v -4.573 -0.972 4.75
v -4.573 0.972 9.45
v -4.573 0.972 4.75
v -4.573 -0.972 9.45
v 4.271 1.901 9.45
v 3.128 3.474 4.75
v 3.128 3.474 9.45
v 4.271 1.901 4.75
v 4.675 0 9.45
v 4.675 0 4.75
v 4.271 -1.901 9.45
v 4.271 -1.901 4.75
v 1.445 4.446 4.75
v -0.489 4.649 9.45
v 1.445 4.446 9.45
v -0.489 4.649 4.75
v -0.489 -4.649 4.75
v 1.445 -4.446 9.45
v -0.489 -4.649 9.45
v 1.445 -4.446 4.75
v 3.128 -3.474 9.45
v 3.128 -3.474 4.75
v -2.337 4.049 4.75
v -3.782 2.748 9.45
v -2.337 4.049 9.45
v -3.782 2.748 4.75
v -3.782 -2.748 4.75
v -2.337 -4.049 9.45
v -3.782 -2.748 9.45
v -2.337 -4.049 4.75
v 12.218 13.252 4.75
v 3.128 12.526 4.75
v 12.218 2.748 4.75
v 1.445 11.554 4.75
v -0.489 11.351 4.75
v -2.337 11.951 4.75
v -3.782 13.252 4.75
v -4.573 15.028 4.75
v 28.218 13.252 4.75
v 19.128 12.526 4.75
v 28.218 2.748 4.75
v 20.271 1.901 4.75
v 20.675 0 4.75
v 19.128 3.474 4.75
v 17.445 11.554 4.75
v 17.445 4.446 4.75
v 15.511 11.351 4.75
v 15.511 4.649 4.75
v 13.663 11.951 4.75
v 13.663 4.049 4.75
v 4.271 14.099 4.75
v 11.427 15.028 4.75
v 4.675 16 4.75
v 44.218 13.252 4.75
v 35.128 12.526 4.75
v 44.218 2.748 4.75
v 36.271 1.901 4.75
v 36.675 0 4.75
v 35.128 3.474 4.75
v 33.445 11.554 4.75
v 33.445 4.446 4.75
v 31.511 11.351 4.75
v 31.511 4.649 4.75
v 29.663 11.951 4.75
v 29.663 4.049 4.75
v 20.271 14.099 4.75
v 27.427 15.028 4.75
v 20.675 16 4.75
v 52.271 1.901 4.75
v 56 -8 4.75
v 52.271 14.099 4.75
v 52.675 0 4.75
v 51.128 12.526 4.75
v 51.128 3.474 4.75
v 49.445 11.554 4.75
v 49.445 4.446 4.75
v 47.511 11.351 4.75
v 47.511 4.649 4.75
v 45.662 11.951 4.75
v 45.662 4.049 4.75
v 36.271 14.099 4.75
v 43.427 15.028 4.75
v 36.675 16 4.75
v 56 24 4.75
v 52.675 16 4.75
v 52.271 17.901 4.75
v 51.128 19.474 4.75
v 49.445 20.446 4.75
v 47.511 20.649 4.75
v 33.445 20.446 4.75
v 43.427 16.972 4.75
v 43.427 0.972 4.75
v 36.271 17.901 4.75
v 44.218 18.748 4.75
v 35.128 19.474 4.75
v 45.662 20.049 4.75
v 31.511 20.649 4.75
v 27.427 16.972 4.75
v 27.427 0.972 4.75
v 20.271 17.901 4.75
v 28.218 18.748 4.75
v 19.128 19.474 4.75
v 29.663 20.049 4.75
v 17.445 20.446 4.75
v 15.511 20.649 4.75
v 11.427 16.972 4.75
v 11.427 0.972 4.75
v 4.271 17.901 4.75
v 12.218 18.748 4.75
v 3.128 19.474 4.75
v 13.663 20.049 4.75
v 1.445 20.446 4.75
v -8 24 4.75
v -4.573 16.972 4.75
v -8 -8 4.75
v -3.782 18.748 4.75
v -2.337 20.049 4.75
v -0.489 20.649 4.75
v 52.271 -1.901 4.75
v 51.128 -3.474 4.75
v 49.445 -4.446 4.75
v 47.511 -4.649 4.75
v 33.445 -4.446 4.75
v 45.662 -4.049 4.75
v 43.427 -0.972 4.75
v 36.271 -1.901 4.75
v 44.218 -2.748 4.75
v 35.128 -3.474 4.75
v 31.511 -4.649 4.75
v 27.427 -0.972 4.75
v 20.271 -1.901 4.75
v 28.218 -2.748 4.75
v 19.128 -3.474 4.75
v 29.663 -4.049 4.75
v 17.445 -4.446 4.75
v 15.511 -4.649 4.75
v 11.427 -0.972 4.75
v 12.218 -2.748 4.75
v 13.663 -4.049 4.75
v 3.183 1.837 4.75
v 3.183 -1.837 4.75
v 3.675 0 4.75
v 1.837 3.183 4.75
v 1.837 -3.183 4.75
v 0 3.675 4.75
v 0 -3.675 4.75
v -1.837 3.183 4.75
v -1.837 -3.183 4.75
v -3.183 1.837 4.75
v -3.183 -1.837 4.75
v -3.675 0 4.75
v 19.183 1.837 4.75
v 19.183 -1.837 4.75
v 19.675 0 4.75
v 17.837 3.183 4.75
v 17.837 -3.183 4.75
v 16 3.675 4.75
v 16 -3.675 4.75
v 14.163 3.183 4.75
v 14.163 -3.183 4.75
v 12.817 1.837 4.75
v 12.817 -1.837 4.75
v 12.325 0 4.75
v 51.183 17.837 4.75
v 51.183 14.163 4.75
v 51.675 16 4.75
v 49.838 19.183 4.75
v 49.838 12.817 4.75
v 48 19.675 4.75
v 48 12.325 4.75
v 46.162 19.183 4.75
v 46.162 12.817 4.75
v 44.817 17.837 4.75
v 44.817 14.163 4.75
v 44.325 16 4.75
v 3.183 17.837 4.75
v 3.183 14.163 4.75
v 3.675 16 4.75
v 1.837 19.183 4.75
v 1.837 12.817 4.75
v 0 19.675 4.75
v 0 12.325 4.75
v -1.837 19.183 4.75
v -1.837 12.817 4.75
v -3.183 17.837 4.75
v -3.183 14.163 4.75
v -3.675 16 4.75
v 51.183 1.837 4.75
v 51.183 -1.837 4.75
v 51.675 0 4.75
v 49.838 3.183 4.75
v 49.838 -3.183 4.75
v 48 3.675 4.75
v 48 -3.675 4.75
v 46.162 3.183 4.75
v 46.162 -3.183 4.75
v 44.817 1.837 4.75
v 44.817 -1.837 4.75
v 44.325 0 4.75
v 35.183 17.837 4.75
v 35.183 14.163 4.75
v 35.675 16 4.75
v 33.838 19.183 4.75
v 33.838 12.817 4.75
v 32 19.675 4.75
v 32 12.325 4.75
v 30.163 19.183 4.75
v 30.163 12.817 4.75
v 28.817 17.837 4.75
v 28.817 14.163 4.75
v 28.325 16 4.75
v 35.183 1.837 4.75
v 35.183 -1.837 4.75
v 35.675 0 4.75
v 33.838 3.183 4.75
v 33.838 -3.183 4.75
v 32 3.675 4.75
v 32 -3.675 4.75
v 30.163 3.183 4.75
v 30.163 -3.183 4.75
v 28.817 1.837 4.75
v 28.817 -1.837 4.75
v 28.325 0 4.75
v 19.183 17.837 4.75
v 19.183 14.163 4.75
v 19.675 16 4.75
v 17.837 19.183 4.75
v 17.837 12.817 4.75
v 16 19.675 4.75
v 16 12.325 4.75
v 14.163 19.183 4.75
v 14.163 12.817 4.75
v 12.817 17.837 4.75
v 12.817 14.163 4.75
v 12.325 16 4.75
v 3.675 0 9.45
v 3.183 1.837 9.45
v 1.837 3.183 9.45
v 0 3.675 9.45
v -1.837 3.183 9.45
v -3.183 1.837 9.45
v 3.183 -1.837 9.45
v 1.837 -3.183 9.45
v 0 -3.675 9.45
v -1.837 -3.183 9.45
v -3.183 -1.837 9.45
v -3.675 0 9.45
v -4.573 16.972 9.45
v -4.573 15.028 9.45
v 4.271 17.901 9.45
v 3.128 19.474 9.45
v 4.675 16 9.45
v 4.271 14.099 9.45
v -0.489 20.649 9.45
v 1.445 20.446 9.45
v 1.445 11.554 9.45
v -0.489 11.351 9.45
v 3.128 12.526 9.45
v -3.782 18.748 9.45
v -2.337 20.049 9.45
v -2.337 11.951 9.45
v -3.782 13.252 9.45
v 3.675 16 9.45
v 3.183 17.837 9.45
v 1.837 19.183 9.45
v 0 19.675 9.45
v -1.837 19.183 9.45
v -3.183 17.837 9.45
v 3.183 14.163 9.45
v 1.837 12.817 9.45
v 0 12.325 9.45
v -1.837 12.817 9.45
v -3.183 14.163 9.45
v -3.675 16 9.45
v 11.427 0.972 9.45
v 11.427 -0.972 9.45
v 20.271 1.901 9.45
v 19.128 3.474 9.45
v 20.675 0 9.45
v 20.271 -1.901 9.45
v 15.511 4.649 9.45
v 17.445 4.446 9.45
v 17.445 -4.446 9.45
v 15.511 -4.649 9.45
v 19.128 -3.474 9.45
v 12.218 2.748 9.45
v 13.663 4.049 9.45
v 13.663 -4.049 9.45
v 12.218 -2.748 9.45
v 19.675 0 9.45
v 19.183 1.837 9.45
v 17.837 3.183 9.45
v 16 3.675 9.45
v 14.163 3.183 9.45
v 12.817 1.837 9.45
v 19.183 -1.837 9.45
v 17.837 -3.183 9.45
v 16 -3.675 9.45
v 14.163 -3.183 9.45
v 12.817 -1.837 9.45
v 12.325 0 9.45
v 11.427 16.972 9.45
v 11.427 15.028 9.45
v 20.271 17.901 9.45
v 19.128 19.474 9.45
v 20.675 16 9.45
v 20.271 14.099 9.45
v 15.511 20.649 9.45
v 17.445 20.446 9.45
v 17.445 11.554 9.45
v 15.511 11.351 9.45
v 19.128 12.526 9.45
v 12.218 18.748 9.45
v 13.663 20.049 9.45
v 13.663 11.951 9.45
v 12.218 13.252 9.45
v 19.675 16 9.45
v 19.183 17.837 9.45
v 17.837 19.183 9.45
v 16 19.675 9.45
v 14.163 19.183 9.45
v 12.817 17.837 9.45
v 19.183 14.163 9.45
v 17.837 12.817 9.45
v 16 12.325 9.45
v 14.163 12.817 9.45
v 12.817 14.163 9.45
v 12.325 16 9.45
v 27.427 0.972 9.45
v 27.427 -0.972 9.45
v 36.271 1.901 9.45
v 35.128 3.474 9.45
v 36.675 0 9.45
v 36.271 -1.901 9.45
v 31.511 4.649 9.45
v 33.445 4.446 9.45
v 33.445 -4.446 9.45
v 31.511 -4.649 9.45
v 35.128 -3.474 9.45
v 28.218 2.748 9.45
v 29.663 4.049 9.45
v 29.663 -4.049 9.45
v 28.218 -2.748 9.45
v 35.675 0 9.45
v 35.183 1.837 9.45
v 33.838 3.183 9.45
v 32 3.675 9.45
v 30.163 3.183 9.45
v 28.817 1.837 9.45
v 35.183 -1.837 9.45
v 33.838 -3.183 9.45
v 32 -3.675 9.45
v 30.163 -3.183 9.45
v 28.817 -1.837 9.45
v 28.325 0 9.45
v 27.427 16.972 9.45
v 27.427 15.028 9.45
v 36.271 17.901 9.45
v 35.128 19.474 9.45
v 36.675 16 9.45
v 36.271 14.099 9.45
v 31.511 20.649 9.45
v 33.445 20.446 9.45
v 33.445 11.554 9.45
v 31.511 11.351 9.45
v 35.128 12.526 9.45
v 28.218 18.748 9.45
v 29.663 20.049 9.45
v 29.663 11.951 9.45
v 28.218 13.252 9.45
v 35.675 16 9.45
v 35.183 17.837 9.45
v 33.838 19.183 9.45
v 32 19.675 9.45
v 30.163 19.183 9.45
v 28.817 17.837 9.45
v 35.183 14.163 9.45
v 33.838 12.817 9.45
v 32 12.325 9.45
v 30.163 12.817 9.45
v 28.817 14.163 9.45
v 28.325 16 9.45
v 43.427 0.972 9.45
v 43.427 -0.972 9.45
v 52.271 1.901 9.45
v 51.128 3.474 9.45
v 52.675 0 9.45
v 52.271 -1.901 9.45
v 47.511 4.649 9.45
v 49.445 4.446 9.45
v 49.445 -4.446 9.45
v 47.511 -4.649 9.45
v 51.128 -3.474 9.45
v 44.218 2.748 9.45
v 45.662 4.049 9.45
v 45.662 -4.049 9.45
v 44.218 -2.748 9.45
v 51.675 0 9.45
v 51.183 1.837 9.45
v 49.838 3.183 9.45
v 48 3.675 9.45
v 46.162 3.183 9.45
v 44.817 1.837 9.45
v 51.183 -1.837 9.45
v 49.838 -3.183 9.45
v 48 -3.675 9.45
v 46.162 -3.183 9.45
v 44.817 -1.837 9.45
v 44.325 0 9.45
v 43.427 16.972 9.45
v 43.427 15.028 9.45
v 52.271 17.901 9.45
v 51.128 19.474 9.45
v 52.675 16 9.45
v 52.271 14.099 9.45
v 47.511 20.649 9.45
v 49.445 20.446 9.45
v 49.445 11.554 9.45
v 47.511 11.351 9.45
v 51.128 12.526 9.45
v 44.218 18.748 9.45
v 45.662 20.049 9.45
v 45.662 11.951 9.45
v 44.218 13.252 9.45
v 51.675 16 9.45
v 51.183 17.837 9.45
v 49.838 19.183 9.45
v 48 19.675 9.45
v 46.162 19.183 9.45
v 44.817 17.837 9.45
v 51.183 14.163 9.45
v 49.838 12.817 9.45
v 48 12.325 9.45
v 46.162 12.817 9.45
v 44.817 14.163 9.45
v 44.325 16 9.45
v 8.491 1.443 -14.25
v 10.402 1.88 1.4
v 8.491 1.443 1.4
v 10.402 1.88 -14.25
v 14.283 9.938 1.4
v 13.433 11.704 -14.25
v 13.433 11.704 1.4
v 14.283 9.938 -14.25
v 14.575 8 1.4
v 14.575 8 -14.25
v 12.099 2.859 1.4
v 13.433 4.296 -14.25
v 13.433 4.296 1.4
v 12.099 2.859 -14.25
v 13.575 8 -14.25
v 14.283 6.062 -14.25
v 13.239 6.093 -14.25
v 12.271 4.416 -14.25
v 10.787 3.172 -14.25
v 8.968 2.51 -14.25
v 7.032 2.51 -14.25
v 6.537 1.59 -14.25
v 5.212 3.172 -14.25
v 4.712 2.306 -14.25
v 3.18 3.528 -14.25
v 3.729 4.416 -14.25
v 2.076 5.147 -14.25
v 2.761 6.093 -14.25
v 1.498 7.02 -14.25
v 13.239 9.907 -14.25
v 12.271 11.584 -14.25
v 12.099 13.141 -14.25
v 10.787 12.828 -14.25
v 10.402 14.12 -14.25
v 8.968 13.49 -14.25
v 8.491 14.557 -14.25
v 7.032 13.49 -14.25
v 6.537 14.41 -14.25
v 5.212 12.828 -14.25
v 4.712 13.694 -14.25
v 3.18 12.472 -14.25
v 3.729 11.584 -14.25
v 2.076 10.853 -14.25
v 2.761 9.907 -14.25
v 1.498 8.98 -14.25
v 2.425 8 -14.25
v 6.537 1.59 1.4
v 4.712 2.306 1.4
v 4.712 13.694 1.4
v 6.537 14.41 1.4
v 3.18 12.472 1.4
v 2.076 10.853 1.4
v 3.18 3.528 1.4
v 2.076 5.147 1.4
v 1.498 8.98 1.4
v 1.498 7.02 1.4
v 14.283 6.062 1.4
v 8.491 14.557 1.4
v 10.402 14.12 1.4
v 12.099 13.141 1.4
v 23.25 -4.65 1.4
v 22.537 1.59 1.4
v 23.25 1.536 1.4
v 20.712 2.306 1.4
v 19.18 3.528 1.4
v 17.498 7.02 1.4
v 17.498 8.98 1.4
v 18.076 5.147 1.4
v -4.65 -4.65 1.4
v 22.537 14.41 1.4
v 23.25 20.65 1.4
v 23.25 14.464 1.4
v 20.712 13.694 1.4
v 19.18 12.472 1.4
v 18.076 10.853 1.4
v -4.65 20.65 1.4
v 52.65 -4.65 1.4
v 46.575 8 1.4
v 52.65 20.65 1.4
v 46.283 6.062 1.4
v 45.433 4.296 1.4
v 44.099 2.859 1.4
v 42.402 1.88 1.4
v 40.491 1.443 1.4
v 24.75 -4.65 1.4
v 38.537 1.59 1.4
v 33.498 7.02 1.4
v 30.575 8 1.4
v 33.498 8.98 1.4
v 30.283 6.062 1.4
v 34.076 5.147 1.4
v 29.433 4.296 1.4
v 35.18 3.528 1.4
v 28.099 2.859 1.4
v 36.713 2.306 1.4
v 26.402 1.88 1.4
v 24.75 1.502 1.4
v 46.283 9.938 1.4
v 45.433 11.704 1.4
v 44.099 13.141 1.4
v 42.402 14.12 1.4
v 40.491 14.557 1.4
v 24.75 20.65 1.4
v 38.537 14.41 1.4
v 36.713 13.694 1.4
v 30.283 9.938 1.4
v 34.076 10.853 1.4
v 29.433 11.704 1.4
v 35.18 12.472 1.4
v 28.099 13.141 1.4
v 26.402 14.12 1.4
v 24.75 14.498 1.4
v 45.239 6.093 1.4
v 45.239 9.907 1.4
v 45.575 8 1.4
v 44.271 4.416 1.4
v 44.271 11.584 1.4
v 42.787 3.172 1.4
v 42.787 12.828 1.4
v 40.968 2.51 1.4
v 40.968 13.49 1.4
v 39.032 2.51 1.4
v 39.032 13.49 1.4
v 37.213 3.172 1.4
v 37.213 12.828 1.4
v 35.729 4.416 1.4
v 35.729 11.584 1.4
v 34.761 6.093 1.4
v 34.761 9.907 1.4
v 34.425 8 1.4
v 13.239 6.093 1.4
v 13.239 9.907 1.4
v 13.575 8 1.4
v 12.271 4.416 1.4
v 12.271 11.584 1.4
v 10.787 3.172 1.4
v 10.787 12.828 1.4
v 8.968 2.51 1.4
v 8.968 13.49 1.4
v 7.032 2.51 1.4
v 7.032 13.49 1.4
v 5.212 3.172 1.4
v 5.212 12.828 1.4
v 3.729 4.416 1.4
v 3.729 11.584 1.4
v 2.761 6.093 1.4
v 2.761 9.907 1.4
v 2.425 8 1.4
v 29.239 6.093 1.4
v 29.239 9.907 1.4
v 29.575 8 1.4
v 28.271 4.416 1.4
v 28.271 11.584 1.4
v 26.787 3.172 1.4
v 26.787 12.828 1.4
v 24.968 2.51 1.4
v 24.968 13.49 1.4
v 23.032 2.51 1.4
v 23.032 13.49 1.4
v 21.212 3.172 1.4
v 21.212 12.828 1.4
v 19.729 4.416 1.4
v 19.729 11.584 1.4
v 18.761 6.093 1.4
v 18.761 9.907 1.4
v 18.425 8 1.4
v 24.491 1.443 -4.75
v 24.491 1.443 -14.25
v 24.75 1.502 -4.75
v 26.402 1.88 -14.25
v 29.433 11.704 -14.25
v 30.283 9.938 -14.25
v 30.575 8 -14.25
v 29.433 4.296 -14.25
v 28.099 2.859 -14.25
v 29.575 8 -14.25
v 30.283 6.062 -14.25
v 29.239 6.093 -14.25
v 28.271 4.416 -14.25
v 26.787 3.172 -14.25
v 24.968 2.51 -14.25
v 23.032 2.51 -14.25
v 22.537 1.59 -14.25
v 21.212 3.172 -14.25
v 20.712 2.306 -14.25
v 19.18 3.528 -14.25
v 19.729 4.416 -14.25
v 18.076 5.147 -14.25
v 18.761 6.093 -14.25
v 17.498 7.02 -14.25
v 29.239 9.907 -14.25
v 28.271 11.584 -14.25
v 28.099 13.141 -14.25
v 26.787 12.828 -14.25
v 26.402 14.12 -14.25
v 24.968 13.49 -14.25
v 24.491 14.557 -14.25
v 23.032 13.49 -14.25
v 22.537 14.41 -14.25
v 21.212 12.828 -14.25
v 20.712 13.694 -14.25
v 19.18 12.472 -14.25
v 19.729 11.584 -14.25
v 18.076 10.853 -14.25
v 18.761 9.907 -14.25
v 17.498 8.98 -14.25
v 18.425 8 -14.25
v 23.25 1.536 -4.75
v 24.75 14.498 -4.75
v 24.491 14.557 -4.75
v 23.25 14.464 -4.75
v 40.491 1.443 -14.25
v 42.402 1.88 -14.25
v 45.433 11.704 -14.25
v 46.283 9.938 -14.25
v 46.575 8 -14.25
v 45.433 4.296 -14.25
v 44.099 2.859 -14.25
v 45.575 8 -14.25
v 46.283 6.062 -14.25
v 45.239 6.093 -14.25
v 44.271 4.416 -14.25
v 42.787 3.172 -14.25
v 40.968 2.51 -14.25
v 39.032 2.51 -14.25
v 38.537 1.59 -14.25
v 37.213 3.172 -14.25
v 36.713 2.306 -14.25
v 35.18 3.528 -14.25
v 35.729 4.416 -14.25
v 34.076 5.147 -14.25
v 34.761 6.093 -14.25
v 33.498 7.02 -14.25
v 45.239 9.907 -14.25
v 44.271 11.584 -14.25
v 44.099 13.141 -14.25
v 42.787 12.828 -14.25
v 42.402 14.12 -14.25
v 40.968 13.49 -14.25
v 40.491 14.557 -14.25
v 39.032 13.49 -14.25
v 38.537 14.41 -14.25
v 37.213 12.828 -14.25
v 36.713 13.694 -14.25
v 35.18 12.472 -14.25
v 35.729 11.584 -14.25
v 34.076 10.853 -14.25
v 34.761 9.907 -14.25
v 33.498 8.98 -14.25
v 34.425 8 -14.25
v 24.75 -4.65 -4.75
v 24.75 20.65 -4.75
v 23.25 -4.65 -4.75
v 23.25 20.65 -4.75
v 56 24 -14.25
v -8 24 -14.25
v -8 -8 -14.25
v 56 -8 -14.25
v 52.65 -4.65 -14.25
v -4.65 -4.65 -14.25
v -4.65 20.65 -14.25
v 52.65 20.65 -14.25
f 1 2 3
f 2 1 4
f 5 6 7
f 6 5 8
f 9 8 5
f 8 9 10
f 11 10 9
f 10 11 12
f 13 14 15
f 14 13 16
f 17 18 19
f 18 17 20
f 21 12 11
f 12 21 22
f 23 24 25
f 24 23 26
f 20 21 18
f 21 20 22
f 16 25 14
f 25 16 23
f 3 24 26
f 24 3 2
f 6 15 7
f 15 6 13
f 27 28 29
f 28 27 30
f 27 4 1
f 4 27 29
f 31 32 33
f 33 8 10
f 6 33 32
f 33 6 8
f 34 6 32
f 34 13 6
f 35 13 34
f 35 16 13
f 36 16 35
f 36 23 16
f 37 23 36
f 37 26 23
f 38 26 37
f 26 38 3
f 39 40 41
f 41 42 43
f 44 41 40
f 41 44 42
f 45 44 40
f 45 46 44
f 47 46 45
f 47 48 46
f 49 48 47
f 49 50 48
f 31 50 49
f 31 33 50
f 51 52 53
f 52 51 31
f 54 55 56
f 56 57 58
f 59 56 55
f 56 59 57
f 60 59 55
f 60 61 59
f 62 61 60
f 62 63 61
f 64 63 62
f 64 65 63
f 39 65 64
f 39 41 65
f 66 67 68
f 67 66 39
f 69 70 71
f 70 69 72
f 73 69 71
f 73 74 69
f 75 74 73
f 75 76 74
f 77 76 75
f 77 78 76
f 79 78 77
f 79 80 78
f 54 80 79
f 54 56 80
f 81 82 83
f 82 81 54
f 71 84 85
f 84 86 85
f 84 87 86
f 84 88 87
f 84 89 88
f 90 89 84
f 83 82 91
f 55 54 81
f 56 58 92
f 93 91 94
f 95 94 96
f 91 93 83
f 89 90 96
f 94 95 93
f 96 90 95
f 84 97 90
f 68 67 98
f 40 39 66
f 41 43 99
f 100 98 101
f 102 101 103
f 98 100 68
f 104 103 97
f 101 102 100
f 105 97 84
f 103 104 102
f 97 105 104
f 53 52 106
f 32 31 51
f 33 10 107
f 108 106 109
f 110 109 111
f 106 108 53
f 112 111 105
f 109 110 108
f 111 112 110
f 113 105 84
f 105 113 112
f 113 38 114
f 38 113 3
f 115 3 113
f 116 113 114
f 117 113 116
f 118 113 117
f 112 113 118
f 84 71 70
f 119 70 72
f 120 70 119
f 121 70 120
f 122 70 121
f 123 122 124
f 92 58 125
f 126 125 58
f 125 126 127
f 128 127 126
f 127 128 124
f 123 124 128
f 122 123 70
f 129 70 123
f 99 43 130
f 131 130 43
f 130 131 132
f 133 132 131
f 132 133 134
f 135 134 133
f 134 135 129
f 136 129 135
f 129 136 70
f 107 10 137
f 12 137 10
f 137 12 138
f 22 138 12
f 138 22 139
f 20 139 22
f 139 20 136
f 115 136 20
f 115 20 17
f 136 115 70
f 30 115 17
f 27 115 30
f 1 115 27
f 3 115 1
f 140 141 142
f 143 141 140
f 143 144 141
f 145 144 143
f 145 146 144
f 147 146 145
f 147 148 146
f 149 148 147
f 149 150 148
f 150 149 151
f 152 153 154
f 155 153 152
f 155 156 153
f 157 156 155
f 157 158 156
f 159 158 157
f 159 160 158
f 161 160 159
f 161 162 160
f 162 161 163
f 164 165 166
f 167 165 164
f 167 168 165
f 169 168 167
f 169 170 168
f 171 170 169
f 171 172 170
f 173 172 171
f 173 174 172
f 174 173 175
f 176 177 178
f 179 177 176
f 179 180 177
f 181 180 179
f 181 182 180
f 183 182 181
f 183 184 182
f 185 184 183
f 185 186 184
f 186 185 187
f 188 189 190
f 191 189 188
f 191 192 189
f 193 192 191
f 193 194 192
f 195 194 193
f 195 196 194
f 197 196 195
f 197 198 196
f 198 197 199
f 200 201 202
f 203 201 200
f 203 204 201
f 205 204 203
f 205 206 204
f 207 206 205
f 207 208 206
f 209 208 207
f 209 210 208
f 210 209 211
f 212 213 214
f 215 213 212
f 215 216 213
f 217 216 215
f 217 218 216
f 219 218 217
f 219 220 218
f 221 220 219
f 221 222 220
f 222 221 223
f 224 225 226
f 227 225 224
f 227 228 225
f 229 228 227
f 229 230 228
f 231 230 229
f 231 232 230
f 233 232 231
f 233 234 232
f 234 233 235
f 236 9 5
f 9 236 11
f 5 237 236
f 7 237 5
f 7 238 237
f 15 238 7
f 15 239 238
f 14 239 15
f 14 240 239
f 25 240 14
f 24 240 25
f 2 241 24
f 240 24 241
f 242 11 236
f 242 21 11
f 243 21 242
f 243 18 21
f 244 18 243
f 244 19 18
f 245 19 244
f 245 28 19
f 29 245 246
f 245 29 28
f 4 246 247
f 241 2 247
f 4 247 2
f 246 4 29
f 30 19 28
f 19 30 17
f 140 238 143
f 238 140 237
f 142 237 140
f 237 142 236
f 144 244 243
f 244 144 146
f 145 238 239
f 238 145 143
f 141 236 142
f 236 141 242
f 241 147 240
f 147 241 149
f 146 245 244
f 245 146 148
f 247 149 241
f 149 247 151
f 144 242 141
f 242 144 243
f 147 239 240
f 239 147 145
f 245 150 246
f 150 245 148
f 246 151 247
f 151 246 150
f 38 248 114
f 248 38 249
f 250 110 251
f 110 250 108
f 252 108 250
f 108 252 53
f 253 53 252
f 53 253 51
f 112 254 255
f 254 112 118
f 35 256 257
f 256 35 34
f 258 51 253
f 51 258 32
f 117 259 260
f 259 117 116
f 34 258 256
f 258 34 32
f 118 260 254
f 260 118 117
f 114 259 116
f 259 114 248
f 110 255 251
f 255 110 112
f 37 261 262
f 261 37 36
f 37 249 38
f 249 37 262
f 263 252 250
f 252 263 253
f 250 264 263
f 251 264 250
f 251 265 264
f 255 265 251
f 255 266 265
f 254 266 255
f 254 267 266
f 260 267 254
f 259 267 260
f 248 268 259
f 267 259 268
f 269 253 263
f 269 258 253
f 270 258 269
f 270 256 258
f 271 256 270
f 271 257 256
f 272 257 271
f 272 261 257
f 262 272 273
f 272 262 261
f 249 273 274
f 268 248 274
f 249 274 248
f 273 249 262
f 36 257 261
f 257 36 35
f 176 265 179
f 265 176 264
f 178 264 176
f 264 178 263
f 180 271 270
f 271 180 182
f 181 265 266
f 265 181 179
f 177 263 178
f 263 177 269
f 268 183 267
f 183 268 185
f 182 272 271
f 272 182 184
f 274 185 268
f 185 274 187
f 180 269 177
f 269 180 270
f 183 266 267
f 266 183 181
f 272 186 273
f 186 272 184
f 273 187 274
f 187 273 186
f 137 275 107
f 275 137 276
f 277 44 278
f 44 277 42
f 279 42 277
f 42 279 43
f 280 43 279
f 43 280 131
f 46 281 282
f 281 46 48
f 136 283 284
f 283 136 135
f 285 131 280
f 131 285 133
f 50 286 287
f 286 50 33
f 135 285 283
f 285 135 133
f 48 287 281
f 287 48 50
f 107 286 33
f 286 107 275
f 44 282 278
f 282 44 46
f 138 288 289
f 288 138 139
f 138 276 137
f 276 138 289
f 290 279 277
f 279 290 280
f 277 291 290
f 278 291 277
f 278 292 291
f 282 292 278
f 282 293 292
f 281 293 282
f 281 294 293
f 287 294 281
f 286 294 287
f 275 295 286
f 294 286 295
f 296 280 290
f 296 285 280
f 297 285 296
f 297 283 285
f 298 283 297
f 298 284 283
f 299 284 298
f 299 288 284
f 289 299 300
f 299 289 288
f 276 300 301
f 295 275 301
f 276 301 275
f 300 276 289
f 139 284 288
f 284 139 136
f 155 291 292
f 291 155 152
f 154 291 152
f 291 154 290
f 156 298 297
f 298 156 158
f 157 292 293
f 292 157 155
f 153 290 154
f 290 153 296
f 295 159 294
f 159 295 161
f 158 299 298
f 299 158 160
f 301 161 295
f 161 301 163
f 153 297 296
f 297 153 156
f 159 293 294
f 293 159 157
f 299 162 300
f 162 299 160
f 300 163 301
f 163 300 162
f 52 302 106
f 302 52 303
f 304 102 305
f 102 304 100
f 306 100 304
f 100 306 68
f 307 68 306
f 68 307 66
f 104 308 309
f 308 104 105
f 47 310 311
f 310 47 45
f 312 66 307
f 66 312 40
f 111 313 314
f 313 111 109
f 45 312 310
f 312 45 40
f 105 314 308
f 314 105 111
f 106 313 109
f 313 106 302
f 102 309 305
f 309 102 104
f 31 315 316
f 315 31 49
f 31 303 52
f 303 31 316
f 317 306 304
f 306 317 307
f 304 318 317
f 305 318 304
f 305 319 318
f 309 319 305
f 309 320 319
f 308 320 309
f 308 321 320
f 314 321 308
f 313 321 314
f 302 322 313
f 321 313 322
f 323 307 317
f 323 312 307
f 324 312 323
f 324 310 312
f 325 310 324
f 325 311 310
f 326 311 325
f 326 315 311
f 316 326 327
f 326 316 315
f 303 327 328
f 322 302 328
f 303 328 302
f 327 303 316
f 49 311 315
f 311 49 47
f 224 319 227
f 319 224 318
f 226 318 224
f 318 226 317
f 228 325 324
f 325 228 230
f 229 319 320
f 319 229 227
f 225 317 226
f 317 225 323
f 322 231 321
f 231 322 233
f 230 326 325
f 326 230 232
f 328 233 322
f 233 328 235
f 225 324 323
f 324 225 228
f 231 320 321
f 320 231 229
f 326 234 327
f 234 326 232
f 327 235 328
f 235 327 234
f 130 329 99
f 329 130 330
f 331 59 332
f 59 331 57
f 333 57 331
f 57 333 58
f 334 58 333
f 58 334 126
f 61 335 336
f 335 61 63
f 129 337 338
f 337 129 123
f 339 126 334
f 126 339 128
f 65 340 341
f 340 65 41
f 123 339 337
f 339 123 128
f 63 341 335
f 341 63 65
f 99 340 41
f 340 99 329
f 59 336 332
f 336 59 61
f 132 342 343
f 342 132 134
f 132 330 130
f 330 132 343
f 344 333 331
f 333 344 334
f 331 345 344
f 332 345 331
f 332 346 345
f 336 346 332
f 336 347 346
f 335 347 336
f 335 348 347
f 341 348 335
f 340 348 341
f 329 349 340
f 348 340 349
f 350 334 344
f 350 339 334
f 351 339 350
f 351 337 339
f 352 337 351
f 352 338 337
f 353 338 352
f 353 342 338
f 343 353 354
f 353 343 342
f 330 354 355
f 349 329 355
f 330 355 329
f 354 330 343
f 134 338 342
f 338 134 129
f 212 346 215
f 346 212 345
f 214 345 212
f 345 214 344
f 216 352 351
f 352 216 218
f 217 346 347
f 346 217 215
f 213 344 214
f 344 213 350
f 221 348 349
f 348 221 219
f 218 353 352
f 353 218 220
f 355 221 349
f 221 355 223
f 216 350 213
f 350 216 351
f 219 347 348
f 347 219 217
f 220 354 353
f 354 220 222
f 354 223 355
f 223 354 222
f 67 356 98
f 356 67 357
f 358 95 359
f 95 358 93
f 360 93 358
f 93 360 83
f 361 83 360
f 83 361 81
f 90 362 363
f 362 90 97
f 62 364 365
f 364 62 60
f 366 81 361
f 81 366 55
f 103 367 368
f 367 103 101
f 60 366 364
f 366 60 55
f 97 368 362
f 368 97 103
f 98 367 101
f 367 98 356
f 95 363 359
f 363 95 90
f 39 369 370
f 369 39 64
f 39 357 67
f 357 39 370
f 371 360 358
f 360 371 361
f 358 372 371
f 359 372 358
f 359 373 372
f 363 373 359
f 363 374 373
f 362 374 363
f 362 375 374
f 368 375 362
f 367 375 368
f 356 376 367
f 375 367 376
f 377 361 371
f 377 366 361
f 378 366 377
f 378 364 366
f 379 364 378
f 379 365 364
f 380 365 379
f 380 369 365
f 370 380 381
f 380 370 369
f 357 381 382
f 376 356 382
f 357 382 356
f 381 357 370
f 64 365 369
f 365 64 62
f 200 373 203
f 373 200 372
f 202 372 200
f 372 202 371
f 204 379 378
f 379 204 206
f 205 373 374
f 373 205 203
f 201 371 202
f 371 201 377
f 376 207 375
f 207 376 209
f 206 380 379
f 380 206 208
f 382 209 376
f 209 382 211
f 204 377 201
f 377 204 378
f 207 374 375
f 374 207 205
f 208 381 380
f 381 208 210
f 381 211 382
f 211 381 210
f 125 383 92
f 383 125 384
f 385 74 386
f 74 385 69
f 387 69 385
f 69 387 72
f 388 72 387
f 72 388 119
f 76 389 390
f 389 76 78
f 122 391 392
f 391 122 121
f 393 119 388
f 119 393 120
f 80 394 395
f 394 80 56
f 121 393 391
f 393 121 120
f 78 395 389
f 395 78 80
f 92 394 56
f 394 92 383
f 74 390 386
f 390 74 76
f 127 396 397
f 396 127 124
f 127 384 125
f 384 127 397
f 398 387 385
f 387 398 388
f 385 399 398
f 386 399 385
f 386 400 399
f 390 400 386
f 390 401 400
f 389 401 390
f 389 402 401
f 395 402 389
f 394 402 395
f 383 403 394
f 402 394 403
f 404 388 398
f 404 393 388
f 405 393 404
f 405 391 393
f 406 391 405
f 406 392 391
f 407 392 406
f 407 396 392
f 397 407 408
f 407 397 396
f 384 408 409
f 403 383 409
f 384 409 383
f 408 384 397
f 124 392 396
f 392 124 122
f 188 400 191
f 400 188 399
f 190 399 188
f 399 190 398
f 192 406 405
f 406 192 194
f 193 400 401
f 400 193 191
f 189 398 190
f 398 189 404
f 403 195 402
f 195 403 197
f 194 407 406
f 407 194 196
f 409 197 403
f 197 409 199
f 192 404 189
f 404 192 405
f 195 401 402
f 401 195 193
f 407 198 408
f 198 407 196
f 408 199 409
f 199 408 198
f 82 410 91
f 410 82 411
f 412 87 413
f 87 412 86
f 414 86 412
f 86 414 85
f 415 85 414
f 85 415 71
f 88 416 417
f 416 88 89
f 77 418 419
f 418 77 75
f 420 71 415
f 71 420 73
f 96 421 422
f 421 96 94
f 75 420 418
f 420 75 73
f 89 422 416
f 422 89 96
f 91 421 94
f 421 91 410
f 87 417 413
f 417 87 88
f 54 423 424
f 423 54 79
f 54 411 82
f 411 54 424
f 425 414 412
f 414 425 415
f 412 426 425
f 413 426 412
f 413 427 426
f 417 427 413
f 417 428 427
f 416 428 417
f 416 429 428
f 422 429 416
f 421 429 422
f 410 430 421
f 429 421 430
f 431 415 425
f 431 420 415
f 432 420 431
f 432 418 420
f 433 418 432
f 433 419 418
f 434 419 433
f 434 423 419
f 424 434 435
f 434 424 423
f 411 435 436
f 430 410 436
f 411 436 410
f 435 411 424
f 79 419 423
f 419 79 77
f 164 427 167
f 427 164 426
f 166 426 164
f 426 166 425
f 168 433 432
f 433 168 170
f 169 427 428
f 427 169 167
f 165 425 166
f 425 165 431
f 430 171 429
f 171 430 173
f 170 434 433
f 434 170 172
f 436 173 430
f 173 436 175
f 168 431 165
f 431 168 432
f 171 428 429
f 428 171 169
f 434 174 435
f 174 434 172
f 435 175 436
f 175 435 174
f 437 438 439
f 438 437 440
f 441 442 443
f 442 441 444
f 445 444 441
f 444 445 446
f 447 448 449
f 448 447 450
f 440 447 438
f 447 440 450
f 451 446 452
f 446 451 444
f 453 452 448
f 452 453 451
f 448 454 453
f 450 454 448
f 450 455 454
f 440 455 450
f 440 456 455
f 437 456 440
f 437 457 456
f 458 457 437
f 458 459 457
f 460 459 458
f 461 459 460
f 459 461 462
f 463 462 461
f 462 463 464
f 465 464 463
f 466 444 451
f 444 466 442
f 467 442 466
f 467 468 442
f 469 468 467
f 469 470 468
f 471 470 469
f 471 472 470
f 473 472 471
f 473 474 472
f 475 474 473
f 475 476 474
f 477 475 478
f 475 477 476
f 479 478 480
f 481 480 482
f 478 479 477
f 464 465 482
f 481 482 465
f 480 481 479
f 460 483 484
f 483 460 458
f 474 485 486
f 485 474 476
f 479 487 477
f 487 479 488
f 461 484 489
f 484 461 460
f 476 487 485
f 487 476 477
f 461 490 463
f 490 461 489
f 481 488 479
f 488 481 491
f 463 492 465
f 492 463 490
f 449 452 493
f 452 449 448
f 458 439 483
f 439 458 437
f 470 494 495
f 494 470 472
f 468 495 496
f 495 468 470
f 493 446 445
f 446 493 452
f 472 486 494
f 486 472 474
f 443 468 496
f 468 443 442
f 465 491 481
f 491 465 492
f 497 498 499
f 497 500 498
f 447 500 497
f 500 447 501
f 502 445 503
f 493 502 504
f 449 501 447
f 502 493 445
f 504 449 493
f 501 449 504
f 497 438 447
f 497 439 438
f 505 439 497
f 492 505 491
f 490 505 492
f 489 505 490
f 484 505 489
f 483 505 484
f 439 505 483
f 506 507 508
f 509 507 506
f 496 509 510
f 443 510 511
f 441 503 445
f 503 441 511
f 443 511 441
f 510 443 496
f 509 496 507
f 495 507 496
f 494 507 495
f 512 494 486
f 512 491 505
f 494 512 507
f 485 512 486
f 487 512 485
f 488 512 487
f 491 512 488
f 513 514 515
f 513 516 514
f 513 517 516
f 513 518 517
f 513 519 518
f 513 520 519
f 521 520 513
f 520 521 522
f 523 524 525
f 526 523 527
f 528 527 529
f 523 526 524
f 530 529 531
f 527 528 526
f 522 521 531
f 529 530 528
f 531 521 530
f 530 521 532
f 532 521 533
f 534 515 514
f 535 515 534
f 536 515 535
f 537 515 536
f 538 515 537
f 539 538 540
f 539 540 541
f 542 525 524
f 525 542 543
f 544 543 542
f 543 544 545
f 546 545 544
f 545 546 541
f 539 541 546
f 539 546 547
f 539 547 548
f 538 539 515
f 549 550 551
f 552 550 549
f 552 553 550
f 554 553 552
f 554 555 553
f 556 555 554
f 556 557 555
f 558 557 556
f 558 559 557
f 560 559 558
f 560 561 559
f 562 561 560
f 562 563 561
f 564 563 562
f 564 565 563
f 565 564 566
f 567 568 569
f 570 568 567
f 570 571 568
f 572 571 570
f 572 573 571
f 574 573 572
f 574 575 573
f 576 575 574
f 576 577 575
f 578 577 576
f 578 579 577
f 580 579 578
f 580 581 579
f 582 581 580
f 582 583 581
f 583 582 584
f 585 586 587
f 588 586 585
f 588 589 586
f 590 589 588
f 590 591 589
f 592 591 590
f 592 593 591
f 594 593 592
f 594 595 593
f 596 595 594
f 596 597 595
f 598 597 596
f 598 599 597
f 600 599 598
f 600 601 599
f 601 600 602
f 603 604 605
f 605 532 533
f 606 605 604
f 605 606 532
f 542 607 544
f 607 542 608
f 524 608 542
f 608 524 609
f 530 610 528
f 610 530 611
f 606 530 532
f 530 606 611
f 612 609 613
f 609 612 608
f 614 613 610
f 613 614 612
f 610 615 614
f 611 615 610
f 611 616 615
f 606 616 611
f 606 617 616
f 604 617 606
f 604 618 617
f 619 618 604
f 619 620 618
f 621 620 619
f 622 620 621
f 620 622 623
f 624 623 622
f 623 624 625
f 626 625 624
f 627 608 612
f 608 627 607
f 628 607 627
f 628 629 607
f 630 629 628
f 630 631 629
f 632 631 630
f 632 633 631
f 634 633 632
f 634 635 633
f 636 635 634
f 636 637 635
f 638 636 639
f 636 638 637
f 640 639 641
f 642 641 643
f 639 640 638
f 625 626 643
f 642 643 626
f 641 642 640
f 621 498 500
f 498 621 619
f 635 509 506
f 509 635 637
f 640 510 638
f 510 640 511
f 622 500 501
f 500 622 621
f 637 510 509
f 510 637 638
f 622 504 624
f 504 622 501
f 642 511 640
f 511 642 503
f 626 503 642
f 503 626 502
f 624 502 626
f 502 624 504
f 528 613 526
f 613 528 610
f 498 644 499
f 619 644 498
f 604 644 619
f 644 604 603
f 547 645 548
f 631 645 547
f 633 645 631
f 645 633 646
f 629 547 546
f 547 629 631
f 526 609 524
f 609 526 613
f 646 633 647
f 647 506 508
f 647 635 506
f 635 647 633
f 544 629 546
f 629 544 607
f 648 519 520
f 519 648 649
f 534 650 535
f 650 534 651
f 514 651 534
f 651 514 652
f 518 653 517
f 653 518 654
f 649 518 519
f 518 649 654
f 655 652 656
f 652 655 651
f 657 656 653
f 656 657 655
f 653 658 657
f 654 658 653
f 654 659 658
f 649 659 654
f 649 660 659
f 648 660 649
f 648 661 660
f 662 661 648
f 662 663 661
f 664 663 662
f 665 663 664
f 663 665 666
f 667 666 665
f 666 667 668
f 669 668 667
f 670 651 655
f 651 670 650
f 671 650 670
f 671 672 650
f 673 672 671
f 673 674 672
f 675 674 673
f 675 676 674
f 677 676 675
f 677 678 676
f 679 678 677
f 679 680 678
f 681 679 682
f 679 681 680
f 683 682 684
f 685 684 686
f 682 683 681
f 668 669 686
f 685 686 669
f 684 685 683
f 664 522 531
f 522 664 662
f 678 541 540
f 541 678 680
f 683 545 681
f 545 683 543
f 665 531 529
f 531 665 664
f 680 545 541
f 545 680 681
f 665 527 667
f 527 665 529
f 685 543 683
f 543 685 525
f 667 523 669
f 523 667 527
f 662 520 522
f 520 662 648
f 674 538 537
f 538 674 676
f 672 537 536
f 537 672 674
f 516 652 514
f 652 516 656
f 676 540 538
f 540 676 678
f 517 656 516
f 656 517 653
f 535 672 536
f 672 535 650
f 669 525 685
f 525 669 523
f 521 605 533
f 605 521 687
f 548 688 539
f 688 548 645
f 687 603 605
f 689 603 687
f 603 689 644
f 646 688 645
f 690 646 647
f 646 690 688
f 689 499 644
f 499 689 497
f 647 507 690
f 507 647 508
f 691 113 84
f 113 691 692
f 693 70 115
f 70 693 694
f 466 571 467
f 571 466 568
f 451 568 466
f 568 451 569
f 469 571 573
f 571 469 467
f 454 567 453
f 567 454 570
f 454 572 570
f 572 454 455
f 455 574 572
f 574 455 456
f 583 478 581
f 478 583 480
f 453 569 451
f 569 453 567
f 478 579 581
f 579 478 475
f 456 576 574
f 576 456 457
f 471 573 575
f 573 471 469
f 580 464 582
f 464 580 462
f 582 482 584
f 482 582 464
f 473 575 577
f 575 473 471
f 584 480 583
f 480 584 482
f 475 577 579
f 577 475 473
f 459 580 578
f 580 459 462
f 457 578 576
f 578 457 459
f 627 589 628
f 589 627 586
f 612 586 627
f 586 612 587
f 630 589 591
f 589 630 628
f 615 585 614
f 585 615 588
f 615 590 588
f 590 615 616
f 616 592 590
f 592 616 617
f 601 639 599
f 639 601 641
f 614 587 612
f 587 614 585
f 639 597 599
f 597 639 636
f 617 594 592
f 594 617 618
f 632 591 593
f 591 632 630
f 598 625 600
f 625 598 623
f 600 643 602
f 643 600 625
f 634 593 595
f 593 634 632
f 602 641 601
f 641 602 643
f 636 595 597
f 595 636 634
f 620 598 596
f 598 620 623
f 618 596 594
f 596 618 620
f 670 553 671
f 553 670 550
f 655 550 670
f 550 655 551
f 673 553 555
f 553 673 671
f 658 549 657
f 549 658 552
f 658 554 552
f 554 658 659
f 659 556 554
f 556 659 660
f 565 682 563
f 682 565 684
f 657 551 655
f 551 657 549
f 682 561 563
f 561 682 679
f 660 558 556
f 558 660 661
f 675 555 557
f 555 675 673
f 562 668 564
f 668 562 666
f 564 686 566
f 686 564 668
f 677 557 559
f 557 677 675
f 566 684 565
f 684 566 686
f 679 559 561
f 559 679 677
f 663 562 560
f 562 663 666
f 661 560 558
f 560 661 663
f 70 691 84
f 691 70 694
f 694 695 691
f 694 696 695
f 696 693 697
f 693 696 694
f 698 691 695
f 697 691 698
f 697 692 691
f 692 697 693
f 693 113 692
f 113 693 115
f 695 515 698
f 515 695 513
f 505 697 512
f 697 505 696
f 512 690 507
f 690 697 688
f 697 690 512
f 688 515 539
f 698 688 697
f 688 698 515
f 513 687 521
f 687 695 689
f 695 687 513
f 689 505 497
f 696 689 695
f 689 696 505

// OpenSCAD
/**
 * Lego brick
 * @author Vojtech Myslivec
 * @param num_x pocet pinu na ose x
 * @param num_y pocet pinu na ose y
 * @param num_z vyska na ose z v jednotkach lega dupla, obycejny dil ma 2 jednotky
 * @param smooth jestli dil ma byt hladky nebo ne 
 */

module duplo(
                num_x   = 4,
                num_y   = 2,
                num_z   = 2,
                smooth  = false
            ) {
    // konstanty
    layer_height = 9.5;
    pin_radius   = 9.35/2;
    pin_height   = 14.2 - layer_height;
    pin_distance = 25.35-pin_radius*2;
    wall_thick   = 3.35;
    stred_radius = 13.15/2;

    mezera      = pin_distance - 2*pin_radius;

    kostka_x    = num_x * (mezera + pin_radius*2);
    kostka_y    = num_y * (mezera + pin_radius*2);
    kostka_z    = num_z * layer_height;

    pozice_x    = 0-pin_radius-mezera/2;
    pozice_y    = 0-pin_radius-mezera/2;
    pozice_z    = 0-layer_height/2-(num_z-1)*layer_height;

    vyztuha_tloustka    = 1.5;
    vyztuha_vyska       = (num_z-1)*layer_height;

    // cudliky -------------------------------------------------------
    if ( !smooth ) {
        for( i=[0:num_x-1], j=[0:num_y-1] ) {
            translate([ i*(mezera + pin_radius*2), j*(mezera + pin_radius*2), layer_height/2]) 
                difference() {
                    cylinder(   r=pin_radius, h=pin_height );
                    cylinder( r=pin_radius-1, h=pin_height+1 );
                }
        }
    }
    // ---------------------------------------------------------------

    if ( num_x != 1 && num_y != 1 ) { 

        difference() {
            union() {

                // valce zespodu -------------------------------------
                for( i=[1:num_x-1], j=[1:num_y-1] ) {
                    translate([ pozice_x+i*pin_distance, pozice_y+j*pin_distance, pozice_z ])
                        cylinder( r=stred_radius, h=kostka_z-wall_thick );

                }
                // ---------------------------------------------------

                // vystuhy -------------------------------------------
                translate([ pozice_x, pozice_y, pozice_z+layer_height ]) {

                    for ( j=[2:2:num_y/2] ) {
                        translate([ 0, (num_y-j)*pin_distance-vyztuha_tloustka/2, 0 ])
                            cube([ kostka_x, vyztuha_tloustka, vyztuha_vyska ]);
                        translate([ 0, j*pin_distance-vyztuha_tloustka/2, 0 ])
                            cube([ kostka_x, vyztuha_tloustka, vyztuha_vyska ]);
                    }
                    for ( i=[2:2:num_x/2] ) {
                        translate([ (num_x-i)*pin_distance-vyztuha_tloustka/2, 0, 0 ])
                            cube([ vyztuha_tloustka, kostka_y, vyztuha_vyska ]);
                        translate([ i*pin_distance-vyztuha_tloustka/2, 0, 0 ])
                            cube([ vyztuha_tloustka, kostka_y, vyztuha_vyska ]);
                    }
                }
                // ---------------------------------------------------

            }

            // vyrez valcu a vyztuh zespodu --------------------------
            for( i=[1:num_x-1], j=[1:num_y-1] ) {
                translate([ pozice_x+i*pin_distance, pozice_y+j*pin_distance, pozice_z - 1])
                    cylinder( r=stred_radius-1, h=kostka_z-wall_thick+1 );
            }
            // -------------------------------------------------------
        }
    }

    // duta kostka ---------------------------------------------------
    translate([ pozice_x, pozice_y, (kostka_z==0?wall_thick:pozice_z) ]) {
        difference() {
            cube([ kostka_x, kostka_y, (kostka_z==0?wall_thick:kostka_z) ]);

            translate([ wall_thick, wall_thick, 0 - wall_thick ])
                cube([ kostka_x-2*wall_thick, kostka_y-2*wall_thick, kostka_z ]);
        }
    }
    // ---------------------------------------------------------------

    //    echo( "kostka_x = ", kostka_x );
    //    echo( "dira x   = ", kostka_x - 2*wall_thick );
    //    echo( "kostka_y = ", kostka_y );
    //    echo( "dira y   = ", kostka_y - 2*wall_thick );
};


duplo( 4, 2, 2 );
//for ( i=[1:8], j=[1:8] ) {
//    if ( i>=j )
//        translate([ (i-1)*120, (j-1)*120 ])
//            duplo( i, j );
//}
